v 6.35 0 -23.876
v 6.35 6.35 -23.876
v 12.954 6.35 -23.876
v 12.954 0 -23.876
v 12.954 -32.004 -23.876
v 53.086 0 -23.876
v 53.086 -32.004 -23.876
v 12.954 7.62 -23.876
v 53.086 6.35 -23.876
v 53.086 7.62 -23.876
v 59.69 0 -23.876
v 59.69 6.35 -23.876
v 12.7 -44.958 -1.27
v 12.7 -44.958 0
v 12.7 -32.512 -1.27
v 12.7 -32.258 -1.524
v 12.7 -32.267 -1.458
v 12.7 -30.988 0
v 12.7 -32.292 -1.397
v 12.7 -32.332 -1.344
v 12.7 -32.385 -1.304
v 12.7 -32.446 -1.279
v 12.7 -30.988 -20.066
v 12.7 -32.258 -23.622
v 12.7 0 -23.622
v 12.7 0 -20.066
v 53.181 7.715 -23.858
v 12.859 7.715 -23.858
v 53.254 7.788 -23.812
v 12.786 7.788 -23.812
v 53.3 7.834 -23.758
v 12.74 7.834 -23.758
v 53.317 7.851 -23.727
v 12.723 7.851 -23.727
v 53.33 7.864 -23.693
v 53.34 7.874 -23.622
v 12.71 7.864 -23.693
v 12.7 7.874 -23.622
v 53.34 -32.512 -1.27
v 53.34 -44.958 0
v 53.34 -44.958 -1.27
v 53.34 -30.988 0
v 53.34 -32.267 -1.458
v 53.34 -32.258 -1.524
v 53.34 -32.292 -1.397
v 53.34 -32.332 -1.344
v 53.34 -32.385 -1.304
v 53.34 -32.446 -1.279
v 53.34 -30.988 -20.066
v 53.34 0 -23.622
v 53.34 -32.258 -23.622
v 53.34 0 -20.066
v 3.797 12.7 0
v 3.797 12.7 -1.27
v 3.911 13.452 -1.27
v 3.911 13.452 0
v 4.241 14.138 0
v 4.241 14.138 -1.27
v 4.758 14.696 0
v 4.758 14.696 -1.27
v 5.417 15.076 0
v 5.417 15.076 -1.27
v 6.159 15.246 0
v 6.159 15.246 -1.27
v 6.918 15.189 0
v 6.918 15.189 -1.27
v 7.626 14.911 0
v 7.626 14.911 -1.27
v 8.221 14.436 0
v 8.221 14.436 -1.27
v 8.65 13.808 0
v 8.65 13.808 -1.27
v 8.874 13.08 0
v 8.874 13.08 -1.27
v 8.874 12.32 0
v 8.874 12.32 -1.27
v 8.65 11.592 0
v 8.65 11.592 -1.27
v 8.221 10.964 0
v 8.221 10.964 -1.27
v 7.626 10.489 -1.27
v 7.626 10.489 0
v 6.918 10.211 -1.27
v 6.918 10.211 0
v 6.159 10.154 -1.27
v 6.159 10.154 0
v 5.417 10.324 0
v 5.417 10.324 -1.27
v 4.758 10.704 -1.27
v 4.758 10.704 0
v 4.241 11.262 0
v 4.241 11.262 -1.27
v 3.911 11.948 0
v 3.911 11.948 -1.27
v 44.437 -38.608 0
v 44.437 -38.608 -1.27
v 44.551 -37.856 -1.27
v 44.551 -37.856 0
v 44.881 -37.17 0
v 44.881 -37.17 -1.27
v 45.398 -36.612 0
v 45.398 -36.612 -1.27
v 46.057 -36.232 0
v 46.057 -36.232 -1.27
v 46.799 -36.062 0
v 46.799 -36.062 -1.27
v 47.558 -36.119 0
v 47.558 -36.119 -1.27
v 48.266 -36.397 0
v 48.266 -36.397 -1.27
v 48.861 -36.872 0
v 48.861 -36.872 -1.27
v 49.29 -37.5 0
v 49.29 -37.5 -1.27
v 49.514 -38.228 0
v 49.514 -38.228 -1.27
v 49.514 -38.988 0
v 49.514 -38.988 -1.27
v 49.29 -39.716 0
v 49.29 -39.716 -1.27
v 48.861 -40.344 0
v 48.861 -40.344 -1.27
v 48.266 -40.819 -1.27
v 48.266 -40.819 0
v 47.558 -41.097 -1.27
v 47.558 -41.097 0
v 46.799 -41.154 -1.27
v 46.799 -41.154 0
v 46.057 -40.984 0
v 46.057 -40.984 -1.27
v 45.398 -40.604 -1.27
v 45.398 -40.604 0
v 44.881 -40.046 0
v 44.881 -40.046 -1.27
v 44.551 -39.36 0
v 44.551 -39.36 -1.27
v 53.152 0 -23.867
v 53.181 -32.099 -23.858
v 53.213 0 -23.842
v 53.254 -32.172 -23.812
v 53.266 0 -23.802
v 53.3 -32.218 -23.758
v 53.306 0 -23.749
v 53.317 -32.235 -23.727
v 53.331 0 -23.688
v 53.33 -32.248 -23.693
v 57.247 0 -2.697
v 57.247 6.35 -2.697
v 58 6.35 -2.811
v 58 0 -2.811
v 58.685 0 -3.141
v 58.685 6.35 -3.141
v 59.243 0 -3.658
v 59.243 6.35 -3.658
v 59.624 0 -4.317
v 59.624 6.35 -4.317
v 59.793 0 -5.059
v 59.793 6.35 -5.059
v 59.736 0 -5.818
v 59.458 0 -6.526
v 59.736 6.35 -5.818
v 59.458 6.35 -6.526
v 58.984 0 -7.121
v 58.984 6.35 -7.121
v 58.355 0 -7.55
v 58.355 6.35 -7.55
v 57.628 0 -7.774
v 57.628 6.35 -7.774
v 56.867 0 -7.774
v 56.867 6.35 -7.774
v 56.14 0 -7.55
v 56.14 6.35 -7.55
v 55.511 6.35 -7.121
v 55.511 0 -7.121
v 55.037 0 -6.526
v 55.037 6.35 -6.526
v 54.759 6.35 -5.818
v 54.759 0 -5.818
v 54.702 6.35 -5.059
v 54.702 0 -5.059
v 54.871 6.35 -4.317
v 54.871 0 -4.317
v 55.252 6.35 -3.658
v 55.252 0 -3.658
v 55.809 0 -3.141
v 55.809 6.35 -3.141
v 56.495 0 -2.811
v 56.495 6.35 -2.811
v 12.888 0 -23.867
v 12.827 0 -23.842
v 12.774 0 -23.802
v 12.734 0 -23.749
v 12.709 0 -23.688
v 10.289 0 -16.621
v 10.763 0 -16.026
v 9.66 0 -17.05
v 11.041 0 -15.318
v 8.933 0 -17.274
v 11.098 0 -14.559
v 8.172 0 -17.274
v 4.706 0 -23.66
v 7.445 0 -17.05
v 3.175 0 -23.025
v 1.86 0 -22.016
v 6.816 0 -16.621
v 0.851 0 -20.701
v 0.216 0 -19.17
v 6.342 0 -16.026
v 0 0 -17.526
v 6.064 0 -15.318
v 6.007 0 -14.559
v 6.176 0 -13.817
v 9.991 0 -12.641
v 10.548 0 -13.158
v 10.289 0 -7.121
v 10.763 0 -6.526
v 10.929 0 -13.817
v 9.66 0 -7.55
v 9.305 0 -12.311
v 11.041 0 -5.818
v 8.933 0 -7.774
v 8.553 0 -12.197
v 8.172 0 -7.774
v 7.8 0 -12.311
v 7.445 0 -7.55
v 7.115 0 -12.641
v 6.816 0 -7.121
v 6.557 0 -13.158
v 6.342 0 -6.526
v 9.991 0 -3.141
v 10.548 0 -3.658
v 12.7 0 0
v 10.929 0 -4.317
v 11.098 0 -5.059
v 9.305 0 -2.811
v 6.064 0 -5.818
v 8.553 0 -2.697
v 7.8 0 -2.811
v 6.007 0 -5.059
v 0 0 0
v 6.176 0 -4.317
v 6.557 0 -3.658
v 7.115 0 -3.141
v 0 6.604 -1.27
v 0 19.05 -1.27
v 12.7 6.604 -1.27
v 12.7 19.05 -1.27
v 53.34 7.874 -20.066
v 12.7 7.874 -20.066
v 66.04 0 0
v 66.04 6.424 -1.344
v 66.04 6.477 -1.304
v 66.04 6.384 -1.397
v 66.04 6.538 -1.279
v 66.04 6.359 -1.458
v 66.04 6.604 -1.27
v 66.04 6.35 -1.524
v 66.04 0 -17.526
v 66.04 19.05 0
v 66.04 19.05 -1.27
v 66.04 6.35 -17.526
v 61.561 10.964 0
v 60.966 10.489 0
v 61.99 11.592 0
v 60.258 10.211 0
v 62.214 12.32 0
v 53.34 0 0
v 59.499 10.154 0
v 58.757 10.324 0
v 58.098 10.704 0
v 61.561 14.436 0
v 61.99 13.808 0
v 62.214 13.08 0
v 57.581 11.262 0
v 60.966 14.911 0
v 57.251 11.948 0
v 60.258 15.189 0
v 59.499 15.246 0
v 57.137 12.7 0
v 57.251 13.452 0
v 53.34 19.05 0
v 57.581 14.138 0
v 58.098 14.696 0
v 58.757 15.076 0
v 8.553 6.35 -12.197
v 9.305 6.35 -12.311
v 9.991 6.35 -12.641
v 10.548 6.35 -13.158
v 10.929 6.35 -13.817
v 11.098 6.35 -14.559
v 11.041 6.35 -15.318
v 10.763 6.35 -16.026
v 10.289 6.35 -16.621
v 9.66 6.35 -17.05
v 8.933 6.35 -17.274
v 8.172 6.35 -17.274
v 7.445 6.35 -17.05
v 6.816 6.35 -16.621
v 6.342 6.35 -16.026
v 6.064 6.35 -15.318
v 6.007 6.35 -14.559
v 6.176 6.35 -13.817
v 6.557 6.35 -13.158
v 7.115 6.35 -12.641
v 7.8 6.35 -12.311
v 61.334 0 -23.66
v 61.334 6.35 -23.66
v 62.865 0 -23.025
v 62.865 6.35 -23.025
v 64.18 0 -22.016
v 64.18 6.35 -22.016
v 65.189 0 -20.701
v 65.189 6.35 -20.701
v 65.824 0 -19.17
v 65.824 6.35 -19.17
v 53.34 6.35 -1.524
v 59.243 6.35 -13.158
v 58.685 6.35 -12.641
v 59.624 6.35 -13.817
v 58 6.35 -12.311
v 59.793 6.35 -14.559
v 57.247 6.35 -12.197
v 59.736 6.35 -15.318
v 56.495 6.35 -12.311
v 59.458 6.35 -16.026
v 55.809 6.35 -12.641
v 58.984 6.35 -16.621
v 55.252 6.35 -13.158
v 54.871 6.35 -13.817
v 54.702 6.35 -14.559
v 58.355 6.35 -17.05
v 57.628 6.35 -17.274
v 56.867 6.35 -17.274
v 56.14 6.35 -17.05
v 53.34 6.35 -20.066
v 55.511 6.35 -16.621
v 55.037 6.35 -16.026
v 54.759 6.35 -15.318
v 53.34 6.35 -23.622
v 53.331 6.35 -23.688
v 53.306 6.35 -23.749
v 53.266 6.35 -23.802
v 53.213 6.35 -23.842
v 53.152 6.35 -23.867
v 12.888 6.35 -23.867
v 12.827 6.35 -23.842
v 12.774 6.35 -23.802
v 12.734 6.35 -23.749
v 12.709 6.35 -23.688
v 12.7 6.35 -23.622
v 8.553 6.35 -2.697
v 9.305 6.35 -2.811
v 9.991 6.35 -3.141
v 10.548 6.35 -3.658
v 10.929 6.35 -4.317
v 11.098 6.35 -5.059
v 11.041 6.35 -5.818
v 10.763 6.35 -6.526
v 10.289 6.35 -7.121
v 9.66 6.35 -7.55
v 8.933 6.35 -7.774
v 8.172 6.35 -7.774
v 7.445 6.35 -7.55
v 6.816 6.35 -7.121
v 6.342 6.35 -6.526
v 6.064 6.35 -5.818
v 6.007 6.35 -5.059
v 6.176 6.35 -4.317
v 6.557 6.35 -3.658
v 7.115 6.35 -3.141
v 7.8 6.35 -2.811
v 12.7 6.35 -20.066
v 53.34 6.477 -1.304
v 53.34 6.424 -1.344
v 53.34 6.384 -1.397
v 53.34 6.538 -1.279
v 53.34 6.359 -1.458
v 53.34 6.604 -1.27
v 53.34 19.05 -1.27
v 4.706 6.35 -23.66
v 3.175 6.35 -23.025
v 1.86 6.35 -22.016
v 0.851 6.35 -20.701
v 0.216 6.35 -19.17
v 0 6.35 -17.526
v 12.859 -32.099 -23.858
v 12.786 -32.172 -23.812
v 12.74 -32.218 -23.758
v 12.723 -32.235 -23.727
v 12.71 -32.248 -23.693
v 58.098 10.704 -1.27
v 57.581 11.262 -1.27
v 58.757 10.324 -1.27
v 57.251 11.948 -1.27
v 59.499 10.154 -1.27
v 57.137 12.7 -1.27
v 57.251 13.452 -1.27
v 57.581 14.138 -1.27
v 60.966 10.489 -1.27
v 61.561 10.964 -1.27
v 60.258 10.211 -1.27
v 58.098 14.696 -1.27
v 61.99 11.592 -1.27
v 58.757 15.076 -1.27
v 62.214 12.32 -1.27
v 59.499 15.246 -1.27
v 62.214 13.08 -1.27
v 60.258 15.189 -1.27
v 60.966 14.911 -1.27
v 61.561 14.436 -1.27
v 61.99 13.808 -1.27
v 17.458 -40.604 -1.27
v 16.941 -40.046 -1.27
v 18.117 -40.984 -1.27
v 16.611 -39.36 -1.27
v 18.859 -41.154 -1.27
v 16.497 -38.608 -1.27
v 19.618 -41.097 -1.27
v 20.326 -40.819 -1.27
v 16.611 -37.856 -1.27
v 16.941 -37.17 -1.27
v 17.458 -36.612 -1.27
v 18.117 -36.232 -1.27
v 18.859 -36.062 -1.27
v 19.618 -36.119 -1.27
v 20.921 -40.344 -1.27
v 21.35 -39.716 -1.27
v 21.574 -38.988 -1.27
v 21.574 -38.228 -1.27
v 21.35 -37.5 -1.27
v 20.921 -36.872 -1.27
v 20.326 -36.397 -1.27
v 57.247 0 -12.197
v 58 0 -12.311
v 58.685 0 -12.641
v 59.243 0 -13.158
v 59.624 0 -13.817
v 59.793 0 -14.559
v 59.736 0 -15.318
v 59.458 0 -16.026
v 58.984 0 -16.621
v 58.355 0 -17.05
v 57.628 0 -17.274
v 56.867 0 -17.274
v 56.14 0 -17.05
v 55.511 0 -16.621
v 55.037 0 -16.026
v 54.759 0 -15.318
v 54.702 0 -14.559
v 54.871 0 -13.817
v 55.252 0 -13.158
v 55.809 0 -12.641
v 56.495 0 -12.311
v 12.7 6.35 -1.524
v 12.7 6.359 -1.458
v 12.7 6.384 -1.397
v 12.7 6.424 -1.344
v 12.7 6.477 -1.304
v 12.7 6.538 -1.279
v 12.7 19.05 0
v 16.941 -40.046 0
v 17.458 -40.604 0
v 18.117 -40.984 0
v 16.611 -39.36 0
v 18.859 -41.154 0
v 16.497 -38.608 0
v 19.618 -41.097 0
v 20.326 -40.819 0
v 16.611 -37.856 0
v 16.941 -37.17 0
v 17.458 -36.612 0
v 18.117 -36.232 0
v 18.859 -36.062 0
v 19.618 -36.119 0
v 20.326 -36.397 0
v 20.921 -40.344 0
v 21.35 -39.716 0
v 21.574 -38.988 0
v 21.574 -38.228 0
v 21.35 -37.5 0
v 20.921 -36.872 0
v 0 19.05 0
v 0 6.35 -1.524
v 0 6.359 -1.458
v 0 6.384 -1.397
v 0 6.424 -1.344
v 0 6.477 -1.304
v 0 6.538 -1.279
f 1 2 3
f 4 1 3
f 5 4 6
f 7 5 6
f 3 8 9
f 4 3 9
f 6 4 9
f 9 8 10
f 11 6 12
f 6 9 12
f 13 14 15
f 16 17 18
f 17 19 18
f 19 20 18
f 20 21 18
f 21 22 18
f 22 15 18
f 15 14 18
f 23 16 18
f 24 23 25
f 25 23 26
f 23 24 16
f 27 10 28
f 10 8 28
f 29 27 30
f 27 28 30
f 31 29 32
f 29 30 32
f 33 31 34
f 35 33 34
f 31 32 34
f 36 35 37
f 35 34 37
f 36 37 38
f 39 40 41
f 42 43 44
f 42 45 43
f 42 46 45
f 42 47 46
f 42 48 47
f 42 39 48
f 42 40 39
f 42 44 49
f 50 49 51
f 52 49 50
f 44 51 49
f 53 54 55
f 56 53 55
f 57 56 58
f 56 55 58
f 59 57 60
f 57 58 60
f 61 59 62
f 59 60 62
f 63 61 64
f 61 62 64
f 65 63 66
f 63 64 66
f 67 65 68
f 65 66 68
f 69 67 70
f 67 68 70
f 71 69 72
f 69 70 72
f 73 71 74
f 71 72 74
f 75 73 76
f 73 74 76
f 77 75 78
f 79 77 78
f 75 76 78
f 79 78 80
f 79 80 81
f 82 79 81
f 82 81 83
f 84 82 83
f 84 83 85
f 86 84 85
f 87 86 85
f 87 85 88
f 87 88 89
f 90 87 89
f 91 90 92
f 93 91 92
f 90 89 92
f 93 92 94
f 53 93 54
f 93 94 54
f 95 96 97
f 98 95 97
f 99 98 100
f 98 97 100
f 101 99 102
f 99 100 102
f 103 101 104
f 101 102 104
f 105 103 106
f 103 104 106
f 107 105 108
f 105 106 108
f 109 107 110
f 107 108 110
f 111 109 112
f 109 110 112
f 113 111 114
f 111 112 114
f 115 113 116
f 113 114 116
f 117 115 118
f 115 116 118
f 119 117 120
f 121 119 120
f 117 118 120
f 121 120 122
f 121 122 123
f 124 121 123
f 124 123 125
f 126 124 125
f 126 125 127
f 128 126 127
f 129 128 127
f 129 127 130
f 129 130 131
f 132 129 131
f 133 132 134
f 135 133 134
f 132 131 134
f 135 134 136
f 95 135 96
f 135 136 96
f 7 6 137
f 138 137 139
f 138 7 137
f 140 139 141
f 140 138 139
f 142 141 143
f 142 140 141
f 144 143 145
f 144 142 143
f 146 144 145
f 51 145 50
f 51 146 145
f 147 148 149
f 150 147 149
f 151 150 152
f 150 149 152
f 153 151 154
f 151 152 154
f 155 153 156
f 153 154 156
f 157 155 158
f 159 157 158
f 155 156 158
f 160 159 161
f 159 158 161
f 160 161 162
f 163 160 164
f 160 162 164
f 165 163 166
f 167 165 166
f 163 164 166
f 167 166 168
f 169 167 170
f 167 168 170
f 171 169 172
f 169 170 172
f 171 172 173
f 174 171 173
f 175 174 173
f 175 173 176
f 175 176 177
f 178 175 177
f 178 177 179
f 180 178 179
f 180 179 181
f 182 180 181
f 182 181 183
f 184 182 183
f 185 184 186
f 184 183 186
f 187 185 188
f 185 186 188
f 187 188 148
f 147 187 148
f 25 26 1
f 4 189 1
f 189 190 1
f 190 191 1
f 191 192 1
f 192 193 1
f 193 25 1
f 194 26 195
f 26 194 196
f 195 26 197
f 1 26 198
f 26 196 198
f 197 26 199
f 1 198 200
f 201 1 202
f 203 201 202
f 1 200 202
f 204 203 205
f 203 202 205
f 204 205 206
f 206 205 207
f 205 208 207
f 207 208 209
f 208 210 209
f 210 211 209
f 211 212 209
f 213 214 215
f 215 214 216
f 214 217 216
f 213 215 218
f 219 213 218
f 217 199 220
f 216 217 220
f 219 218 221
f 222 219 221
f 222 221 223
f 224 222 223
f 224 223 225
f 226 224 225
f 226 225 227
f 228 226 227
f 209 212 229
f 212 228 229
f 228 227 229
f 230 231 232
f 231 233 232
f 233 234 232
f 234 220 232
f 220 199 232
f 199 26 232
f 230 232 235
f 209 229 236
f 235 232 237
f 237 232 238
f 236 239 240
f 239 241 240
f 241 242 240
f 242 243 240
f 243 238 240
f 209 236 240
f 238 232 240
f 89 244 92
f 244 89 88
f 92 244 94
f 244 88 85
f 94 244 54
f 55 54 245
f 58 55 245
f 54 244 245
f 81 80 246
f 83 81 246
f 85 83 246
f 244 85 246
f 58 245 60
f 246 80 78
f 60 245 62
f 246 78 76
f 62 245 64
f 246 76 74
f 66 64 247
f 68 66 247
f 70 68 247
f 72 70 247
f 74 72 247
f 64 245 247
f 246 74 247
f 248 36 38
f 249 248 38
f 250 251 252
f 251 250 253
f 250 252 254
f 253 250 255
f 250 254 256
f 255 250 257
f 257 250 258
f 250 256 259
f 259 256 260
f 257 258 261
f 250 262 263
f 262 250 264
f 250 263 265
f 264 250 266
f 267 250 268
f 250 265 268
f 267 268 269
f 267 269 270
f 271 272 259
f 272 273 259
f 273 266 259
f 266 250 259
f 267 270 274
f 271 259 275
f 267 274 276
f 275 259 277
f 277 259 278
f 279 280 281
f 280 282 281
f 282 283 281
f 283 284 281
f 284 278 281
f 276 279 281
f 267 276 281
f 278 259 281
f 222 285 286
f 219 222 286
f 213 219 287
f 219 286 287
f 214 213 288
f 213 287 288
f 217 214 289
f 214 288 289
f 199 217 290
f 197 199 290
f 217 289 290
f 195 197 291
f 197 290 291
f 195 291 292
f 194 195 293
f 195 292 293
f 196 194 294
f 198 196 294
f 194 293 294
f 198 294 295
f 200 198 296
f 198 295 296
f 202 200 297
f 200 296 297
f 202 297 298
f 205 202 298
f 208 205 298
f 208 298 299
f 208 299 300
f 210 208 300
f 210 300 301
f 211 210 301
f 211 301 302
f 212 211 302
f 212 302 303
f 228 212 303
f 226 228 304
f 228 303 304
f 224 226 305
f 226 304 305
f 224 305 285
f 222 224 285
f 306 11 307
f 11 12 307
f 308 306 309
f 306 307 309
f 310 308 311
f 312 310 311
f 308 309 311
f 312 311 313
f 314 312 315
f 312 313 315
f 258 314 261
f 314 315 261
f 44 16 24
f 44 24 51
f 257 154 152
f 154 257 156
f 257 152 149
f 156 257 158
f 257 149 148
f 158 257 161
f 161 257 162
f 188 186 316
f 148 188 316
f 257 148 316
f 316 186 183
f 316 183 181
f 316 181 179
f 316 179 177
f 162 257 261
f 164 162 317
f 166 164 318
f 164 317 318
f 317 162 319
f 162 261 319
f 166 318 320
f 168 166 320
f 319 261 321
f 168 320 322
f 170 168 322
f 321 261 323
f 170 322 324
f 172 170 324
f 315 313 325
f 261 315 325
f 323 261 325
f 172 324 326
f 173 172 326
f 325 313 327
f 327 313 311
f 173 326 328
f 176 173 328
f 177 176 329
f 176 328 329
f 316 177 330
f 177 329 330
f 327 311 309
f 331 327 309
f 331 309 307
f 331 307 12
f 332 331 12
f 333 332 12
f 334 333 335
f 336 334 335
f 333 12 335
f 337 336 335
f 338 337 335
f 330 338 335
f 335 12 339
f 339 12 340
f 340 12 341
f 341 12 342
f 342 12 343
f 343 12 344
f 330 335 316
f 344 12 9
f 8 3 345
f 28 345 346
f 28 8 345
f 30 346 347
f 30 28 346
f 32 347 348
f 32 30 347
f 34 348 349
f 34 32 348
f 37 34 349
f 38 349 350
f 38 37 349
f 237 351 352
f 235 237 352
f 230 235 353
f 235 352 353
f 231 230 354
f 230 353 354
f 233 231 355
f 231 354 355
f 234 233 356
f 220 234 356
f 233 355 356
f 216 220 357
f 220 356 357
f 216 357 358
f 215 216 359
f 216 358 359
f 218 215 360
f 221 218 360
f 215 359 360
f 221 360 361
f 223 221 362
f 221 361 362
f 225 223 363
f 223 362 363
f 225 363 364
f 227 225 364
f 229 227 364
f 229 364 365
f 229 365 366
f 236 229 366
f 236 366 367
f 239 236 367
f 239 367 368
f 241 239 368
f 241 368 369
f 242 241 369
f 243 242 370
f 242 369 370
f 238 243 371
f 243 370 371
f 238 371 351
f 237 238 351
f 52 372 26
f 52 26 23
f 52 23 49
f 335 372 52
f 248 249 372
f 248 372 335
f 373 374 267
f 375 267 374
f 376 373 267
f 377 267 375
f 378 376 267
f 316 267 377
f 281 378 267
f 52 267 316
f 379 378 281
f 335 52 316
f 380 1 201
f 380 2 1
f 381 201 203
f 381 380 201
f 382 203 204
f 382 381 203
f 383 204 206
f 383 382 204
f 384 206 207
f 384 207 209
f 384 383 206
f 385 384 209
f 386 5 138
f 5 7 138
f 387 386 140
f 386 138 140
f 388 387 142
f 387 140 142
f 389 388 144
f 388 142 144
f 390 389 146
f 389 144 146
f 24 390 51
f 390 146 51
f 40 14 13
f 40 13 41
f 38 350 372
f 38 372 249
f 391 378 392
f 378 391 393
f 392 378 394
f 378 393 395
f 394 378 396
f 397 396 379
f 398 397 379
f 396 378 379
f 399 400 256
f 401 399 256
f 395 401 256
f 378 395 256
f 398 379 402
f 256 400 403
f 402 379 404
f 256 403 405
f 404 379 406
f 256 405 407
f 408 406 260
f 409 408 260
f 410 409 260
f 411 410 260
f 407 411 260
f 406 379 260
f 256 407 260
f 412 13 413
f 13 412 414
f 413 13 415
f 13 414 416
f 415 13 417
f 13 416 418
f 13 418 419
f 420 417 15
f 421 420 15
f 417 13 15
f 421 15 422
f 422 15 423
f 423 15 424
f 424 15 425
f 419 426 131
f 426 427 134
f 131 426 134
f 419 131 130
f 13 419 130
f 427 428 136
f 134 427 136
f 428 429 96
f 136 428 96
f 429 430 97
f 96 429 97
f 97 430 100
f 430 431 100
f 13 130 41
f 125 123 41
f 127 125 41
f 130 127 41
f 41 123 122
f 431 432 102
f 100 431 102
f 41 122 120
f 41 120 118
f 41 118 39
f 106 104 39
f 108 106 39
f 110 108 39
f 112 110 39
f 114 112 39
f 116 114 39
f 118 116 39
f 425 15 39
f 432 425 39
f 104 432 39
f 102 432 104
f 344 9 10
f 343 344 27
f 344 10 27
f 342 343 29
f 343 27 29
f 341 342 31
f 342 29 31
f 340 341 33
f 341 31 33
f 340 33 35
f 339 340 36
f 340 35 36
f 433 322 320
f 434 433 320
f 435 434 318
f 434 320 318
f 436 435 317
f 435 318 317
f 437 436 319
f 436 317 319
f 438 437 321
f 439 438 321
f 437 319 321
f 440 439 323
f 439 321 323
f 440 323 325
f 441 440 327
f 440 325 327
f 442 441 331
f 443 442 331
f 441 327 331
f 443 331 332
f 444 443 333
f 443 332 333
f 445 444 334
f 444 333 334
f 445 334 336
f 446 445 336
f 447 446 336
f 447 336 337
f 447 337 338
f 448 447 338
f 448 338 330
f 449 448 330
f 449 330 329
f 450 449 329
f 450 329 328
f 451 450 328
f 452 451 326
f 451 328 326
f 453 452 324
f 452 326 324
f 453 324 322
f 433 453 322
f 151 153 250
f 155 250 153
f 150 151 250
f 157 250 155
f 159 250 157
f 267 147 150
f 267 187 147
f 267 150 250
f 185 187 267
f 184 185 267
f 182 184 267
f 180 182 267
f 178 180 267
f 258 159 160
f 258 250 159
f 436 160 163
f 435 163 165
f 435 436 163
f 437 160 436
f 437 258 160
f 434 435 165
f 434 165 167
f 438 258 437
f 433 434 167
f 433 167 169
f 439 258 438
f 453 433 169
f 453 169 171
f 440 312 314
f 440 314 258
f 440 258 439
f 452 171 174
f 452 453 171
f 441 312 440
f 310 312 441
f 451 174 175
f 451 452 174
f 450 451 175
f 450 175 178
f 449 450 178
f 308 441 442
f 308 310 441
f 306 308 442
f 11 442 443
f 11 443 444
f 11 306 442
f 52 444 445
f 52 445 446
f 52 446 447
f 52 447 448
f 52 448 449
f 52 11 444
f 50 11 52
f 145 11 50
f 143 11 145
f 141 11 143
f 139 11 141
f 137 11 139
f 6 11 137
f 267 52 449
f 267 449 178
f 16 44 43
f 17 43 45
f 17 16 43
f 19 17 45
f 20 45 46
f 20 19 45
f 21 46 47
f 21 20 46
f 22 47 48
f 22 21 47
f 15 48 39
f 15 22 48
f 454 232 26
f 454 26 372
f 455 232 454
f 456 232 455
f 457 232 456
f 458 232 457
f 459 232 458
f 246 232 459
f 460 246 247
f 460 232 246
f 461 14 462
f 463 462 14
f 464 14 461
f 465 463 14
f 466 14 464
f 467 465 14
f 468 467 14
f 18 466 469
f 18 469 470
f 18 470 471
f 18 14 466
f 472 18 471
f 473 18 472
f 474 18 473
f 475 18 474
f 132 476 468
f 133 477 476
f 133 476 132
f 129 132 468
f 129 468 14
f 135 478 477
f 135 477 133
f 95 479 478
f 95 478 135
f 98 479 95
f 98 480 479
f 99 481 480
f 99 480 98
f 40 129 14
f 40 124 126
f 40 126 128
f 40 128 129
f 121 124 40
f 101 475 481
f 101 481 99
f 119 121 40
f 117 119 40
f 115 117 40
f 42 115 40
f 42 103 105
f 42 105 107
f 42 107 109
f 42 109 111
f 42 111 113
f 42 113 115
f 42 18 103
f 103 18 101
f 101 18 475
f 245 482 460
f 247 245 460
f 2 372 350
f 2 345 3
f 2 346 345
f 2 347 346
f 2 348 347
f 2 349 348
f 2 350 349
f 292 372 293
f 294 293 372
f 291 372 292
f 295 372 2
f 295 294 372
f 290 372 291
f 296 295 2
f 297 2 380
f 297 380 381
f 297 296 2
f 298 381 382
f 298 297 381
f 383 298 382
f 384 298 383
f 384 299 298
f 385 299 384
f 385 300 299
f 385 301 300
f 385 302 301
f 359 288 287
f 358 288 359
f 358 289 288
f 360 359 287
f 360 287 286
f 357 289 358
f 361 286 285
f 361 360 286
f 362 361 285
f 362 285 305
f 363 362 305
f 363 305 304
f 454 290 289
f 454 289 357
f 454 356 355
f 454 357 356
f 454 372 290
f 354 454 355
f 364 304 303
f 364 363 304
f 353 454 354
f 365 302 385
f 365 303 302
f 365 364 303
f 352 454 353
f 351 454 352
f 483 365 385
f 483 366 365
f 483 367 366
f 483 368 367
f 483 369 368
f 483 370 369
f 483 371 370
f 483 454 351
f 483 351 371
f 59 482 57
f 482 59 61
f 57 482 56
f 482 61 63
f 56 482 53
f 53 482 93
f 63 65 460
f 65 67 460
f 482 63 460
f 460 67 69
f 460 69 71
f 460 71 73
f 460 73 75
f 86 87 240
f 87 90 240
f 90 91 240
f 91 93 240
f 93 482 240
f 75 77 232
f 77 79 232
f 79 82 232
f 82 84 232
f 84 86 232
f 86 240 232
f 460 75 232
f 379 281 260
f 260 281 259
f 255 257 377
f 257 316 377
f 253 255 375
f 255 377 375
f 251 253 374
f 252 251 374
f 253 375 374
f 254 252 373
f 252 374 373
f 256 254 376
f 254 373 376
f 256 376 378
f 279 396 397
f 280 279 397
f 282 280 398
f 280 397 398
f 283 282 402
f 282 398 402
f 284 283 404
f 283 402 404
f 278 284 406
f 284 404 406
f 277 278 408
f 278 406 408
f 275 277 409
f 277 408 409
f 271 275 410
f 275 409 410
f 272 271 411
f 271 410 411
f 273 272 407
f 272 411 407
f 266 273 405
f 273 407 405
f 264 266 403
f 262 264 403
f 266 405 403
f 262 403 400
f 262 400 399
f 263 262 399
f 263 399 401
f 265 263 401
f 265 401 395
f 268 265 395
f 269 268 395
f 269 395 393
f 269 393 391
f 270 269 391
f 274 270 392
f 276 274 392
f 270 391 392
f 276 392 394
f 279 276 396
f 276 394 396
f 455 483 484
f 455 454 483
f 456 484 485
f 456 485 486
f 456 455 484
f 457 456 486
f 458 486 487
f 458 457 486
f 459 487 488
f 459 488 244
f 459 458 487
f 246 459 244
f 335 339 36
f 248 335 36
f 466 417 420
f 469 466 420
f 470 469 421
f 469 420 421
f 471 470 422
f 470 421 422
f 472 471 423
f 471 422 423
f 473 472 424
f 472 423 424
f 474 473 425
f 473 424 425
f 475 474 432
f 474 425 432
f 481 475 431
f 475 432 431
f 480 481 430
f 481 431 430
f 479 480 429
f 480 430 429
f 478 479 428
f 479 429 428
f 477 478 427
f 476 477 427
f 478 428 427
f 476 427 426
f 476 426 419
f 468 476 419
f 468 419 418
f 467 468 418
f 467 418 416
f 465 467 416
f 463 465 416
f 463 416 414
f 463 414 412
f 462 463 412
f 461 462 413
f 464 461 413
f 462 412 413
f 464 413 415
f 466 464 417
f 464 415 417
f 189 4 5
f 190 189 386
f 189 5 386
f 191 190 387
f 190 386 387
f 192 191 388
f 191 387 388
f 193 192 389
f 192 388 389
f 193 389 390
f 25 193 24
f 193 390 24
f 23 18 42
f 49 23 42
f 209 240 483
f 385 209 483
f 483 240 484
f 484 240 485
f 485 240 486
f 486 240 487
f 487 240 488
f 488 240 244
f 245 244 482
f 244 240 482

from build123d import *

# Parameters (mm, degrees)
SKETCH1_W            = 12.7
SKETCH1_H            = 18.796
BOSS_EXTRUDE1_DEPTH  = 6.35
SKETCH2_R            = 2.5527
CUT_EXTRUDE1_DEPTH   = 6.35
SKETCH3_W            = 66.04
SKETCH3_H            = 6.35
BOSS_EXTRUDE2_DEPTH  = 5.08
SKETCH4_W            = 40.64
SKETCH4_H            = 1.524
BOSS_EXTRUDE5_DEPTH  = 3.81
SKETCH9_W            = 40.64
SKETCH9_H            = 30.988
BOSS_EXTRUDE6_DEPTH  = 3.81
SKETCH10_W           = 53.34
SKETCH10_H           = 6.35
CUT_EXTRUDE3_DEPTH   = 1.27
SKETCH11_W           = 12.7
SKETCH11_H           = 19.05
BOSS_EXTRUDE7_DEPTH  = 1.27
SKETCH16_R           = 2.5527
CUT_EXTRUDE5_DEPTH   = 1.27
SKETCH17_W           = 12.7
SKETCH17_H           = 6.35
BOSS_EXTRUDE8_DEPTH  = 23.876
SKETCH20_R           = 2.5527
CUT_EXTRUDE6_DEPTH   = 6.35
SKETCH21_W           = 12.7
SKETCH21_H           = 19.05
BOSS_EXTRUDE9_DEPTH  = 1.27
SKETCH22_R           = 2.5527
CUT_EXTRUDE7_DEPTH   = 1.27
SKETCH23_W           = 40.64
SKETCH23_H           = 23.876
BOSS_EXTRUDE10_DEPTH = 1.27
SKETCH24_W           = 40.64
SKETCH24_H           = 13.97
BOSS_EXTRUDE11_DEPTH = 1.27
SKETCH25_R           = 2.5527
CUT_EXTRUDE8_DEPTH   = 1.27
FILLET4_R            = 6.35
FILLET5_R            = 0.254


with BuildPart() as part:
    # Sketch1 → Boss-Extrude1 (new body)
    with BuildSketch(Plane(origin=(0, 0, 0), x_dir=(1, 0, 0), z_dir=(0, 1, 0))):
        with Locations((6.35, 9.398)):
            Rectangle(SKETCH1_W, SKETCH1_H)
    extrude(amount=BOSS_EXTRUDE1_DEPTH)

    # Sketch2 → Cut-Extrude1 (cut)
    with BuildSketch(Plane(origin=(0, 6.35, 0), x_dir=(1, 0, 0), z_dir=(0, 1, 0))):
        with Locations(Location((8.552562419, 14.75, 0), (0, 0, 270))):
            Circle(SKETCH2_R)
        with Locations(Location((8.552562419, 5.25, 0), (0, 0, 270))):
            Circle(SKETCH2_R)
    extrude(amount=-CUT_EXTRUDE1_DEPTH, mode=Mode.SUBTRACT)

    # Sketch3 → Boss-Extrude2 (add)
    with BuildSketch(Plane(origin=(0, 0, -18.796), x_dir=(-1, 0, 0), z_dir=(0, 0, -1))):
        with Locations((-33.02, 3.175)):
            Rectangle(SKETCH3_W, SKETCH3_H)
    extrude(amount=BOSS_EXTRUDE2_DEPTH)

    # Sketch4 → Boss-Extrude5 (add)
    with BuildSketch(Plane(origin=(0, 0, -23.876), x_dir=(-1, 0, 0), z_dir=(0, 0, -1))):
        with Locations((-33.02, 7.112)):
            Rectangle(SKETCH4_W, SKETCH4_H)
    extrude(amount=-BOSS_EXTRUDE5_DEPTH)

    # Sketch9 → Boss-Extrude6 (add)
    with BuildSketch(Plane(origin=(0, 0, -23.876), x_dir=(-1, 0, 0), z_dir=(0, 0, -1))):
        with Locations((-33.02, -15.494)):
            Rectangle(SKETCH9_W, SKETCH9_H)
    extrude(amount=-BOSS_EXTRUDE6_DEPTH)

    # Sketch10 → Cut-Extrude3 (cut)
    with BuildSketch(Plane.XY.offset(-18.796)):
        with Locations((39.37, 3.175)):
            Rectangle(SKETCH10_W, SKETCH10_H)
    extrude(amount=-CUT_EXTRUDE3_DEPTH, mode=Mode.SUBTRACT)

    # Sketch11 → Boss-Extrude7 (add)
    with BuildSketch(Plane.XY):
        with Locations((6.35, 9.525)):
            Rectangle(SKETCH11_W, SKETCH11_H)
    extrude(amount=-BOSS_EXTRUDE7_DEPTH)

    # Sketch16 → Cut-Extrude5 (cut)
    with BuildSketch(Plane(origin=(0, 0, -1.27), x_dir=(-1, 0, 0), z_dir=(0, 0, -1))):
        with Locations((-6.35, 12.7)):
            Circle(SKETCH16_R)
    extrude(amount=-CUT_EXTRUDE5_DEPTH, mode=Mode.SUBTRACT)

    # Sketch17 → Boss-Extrude8 (add)
    with BuildSketch(Plane(origin=(0, 0, -23.876), x_dir=(-1, 0, 0), z_dir=(0, 0, -1))):
        with Locations((-59.69, 3.175)):
            Rectangle(SKETCH17_W, SKETCH17_H)
    extrude(amount=-BOSS_EXTRUDE8_DEPTH)

    # Sketch20 → Cut-Extrude6 (cut)
    with BuildSketch(Plane(origin=(0, 6.35, 0), x_dir=(1, 0, 0), z_dir=(0, 1, 0))):
        with Locations(Location((57.247437581, 14.75, 0), (0, 0, 270))):
            Circle(SKETCH20_R)
        with Locations(Location((57.247437581, 5.25, 0), (0, 0, 270))):
            Circle(SKETCH20_R)
    extrude(amount=-CUT_EXTRUDE6_DEPTH, mode=Mode.SUBTRACT)

    # Sketch21 → Boss-Extrude9 (add)
    with BuildSketch(Plane.XY):
        with Locations((59.69, 9.525)):
            Rectangle(SKETCH21_W, SKETCH21_H)
    extrude(amount=-BOSS_EXTRUDE9_DEPTH)

    # Sketch22 → Cut-Extrude7 (cut)
    with BuildSketch(Plane(origin=(0, 0, -1.27), x_dir=(-1, 0, 0), z_dir=(0, 0, -1))):
        with Locations((-59.69, 12.7)):
            Circle(SKETCH22_R)
    extrude(amount=-CUT_EXTRUDE7_DEPTH, mode=Mode.SUBTRACT)

    # Sketch23 → Boss-Extrude10 (add)
    with BuildSketch(Plane.XZ.offset(30.988)):
        with Locations((33.02, -11.938)):
            Rectangle(SKETCH23_W, SKETCH23_H)
    extrude(amount=BOSS_EXTRUDE10_DEPTH)

    # Sketch24 → Boss-Extrude11 (add)
    with BuildSketch(Plane.XY):
        with Locations((33.02, -37.973)):
            Rectangle(SKETCH24_W, SKETCH24_H)
    extrude(amount=-BOSS_EXTRUDE11_DEPTH)

    # Sketch25 → Cut-Extrude8 (cut)
    with BuildSketch(Plane(origin=(0, 0, -1.27), x_dir=(-1, 0, 0), z_dir=(0, 0, -1))):
        with Locations((-46.99, -38.608)):
            Circle(SKETCH25_R)
        with Locations((-19.05, -38.608)):
            Circle(SKETCH25_R)
    extrude(amount=-CUT_EXTRUDE8_DEPTH, mode=Mode.SUBTRACT)

    # Fillet4
    fillet4_edges = [part.edges().sort_by_distance(p)[0] for p in [
        (0, 3.175, -23.876),
        (66.04, 3.175, -23.876),
    ]]
    fillet(fillet4_edges, radius=FILLET4_R)

    # Fillet5
    fillet5_edges = [part.edges().sort_by_distance(p)[0] for p in [
        (59.69, 6.35, -1.27),
        (33.02, -32.258, -23.876),
        (33.02, -32.258, -1.27),
        (53.34, 7.112, -23.876),
        (12.7, 7.112, -23.876),
        (33.02, 7.874, -23.876),
        (12.7, -16.129, -23.876),
        (53.34, -16.129, -23.876),
        (6.35, 6.35, -1.27),
    ]]
    fillet(fillet5_edges, radius=FILLET5_R)


solid = part.part
